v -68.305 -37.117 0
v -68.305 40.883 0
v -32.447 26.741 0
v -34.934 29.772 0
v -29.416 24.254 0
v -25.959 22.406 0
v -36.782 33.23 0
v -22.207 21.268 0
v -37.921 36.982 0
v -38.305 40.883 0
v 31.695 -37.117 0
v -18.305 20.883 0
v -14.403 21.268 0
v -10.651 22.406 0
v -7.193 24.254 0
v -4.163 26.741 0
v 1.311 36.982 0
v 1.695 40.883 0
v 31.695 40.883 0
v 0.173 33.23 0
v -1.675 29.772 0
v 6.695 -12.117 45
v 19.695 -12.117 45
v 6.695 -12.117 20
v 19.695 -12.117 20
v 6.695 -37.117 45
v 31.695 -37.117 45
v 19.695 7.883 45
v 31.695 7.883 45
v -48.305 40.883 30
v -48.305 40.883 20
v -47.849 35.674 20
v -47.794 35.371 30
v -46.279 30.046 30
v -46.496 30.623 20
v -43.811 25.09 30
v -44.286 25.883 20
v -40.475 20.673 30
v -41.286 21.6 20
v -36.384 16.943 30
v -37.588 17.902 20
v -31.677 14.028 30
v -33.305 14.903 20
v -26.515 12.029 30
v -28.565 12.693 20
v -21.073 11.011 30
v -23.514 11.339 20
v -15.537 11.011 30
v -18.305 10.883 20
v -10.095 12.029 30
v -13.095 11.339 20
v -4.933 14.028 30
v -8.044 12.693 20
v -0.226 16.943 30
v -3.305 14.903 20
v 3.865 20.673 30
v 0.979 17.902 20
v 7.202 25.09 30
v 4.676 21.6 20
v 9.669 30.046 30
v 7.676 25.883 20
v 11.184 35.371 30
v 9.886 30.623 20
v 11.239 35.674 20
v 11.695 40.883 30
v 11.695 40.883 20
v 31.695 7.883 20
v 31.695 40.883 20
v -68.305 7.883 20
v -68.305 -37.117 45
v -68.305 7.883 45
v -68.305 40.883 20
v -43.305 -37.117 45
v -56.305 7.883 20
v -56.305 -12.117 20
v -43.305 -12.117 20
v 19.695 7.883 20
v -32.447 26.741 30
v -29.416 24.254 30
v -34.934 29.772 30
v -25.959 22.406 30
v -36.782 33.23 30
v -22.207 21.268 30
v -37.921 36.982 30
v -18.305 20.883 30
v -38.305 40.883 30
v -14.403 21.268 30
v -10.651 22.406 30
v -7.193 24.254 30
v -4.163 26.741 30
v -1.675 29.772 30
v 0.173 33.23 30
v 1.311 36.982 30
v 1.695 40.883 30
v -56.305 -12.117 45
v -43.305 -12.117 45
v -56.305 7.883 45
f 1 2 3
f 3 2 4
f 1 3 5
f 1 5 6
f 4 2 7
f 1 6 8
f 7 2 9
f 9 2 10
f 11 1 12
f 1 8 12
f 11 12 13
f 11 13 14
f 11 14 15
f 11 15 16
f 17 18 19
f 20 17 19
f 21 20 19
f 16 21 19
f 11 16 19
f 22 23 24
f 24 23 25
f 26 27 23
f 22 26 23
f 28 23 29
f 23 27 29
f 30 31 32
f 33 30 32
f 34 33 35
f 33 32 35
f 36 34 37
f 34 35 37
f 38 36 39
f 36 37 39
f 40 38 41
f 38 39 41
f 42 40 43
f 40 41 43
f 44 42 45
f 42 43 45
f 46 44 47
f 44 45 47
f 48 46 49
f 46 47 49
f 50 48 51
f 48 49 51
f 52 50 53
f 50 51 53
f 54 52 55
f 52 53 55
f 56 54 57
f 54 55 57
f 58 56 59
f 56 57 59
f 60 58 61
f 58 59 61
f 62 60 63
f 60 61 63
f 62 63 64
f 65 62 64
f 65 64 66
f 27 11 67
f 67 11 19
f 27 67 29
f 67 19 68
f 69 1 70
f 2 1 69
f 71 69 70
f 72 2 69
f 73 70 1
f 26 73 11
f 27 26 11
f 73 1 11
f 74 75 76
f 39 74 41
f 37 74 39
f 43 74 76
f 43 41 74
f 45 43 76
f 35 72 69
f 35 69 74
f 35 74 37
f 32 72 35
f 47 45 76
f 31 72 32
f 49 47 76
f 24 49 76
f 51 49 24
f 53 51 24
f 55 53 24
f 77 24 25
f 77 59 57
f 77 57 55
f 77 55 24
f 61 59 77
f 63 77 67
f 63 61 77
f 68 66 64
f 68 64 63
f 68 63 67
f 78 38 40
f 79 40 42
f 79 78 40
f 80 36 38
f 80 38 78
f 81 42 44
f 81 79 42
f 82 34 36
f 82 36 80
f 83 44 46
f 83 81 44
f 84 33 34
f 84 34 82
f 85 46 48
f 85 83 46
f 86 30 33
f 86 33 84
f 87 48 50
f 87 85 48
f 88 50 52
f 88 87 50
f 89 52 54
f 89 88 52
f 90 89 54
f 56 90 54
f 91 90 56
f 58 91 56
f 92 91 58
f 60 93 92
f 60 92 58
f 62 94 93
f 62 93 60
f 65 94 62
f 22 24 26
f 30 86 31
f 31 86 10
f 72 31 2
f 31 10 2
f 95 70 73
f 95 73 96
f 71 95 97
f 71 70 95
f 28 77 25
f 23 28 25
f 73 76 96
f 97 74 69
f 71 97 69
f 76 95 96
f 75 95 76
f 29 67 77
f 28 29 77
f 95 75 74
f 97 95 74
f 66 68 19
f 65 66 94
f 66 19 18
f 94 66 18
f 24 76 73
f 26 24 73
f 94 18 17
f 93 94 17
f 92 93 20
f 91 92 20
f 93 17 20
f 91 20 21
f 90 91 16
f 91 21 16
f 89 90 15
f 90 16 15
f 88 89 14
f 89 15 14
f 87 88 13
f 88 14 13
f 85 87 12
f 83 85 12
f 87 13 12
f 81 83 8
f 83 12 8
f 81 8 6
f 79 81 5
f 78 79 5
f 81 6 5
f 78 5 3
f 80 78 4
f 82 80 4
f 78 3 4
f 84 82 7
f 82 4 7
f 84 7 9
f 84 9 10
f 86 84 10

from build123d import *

# Parameters (mm, degrees)
BOSS_EXTRUDE1_DEPTH = 20
BOSS_EXTRUDE2_DEPTH = 30
BOSS_EXTRUDE6_DEPTH = 45
CUT_EXTRUDE6_DEPTH  = 140
BOSS_EXTRUDE7_DEPTH = 25


with BuildPart() as part:
    # Sketch1 → Boss-Extrude1 (new body)
    with BuildSketch(Plane.XY):
        with BuildLine():
            Line((-68.304856892, 40.883398519), (-68.304856892, 7.883398519))
            Line((-68.304856892, 7.883398519), (-56.304856892, 7.883398519))
            Line((-56.304856892, 7.883398519), (-56.304856892, -12.116601481))
            Line((-56.304856892, -12.116601481), (19.695143108, -12.116601481))
            Line((19.695143108, -12.116601481), (19.695143108, 7.883398519))
            Line((19.695143108, 7.883398519), (31.695143108, 7.883398519))
            Line((31.695143108, 7.883398519), (31.695143108, 40.883398519))
            Line((31.695143108, 40.883398519), (11.695143108, 40.883398519))
            ThreePointArc((11.695143108, 40.883398519), (-18.304856892, 10.883398519), (-48.304856892, 40.883398519))
            Line((-48.304856892, 40.883398519), (-68.304856892, 40.883398519))
        make_face()
    extrude(amount=BOSS_EXTRUDE1_DEPTH)

    # Sketch1<3> → Boss-Extrude2 (add)
    with BuildSketch(Plane.XY):
        with BuildLine():
            Line((-38.304856892, 40.883398519), (-48.304856892, 40.883398519))
            ThreePointArc((-48.304856892, 40.883398519), (-18.304856892, 10.883398519), (11.695143108, 40.883398519))
            Line((11.695143108, 40.883398519), (1.695143108, 40.883398519))
            ThreePointArc((1.695143108, 40.883398519), (-18.304856892, 20.883398519), (-38.304856892, 40.883398519))
        make_face()
    extrude(amount=BOSS_EXTRUDE2_DEPTH)

    # Sketch1<6> → Boss-Extrude6 (add)
    with BuildSketch(Plane.XY):
        Polygon((-68.304856892, 7.883398519), (-68.304856892, -37.116601481), (31.695143108, -37.116601481), (31.695143108, 7.883398519), (19.695143108, 7.883398519), (19.695143108, -12.116601481), (-56.304856892, -12.116601481), (-56.304856892, 7.883398519), align=None)
    extrude(amount=BOSS_EXTRUDE6_DEPTH)

    # Sketch3 → Cut-Extrude6 (cut)
    with BuildSketch(Plane.ZY.offset(68.304856892)):
        Polygon((45, -37.116601481), (45, -12.116601481), (20, -12.116601481), align=None)
    extrude(amount=-CUT_EXTRUDE6_DEPTH, mode=Mode.SUBTRACT)

    # Sketch3<2> → Boss-Extrude7 (add)
    with BuildSketch(Plane.ZY.offset(68.304856892)):
        Polygon((45, -37.116601481), (45, -12.116601481), (20, -12.116601481), align=None)
    boss_extrude7 = extrude(amount=-BOSS_EXTRUDE7_DEPTH)

    # Mirror1: Boss-Extrude7 across plane
    add(boss_extrude7.mirror(Plane(origin=(-18.304856892, 0, 0), x_dir=(0, 0, 1), z_dir=(1, 0, 0))))


solid = part.part
